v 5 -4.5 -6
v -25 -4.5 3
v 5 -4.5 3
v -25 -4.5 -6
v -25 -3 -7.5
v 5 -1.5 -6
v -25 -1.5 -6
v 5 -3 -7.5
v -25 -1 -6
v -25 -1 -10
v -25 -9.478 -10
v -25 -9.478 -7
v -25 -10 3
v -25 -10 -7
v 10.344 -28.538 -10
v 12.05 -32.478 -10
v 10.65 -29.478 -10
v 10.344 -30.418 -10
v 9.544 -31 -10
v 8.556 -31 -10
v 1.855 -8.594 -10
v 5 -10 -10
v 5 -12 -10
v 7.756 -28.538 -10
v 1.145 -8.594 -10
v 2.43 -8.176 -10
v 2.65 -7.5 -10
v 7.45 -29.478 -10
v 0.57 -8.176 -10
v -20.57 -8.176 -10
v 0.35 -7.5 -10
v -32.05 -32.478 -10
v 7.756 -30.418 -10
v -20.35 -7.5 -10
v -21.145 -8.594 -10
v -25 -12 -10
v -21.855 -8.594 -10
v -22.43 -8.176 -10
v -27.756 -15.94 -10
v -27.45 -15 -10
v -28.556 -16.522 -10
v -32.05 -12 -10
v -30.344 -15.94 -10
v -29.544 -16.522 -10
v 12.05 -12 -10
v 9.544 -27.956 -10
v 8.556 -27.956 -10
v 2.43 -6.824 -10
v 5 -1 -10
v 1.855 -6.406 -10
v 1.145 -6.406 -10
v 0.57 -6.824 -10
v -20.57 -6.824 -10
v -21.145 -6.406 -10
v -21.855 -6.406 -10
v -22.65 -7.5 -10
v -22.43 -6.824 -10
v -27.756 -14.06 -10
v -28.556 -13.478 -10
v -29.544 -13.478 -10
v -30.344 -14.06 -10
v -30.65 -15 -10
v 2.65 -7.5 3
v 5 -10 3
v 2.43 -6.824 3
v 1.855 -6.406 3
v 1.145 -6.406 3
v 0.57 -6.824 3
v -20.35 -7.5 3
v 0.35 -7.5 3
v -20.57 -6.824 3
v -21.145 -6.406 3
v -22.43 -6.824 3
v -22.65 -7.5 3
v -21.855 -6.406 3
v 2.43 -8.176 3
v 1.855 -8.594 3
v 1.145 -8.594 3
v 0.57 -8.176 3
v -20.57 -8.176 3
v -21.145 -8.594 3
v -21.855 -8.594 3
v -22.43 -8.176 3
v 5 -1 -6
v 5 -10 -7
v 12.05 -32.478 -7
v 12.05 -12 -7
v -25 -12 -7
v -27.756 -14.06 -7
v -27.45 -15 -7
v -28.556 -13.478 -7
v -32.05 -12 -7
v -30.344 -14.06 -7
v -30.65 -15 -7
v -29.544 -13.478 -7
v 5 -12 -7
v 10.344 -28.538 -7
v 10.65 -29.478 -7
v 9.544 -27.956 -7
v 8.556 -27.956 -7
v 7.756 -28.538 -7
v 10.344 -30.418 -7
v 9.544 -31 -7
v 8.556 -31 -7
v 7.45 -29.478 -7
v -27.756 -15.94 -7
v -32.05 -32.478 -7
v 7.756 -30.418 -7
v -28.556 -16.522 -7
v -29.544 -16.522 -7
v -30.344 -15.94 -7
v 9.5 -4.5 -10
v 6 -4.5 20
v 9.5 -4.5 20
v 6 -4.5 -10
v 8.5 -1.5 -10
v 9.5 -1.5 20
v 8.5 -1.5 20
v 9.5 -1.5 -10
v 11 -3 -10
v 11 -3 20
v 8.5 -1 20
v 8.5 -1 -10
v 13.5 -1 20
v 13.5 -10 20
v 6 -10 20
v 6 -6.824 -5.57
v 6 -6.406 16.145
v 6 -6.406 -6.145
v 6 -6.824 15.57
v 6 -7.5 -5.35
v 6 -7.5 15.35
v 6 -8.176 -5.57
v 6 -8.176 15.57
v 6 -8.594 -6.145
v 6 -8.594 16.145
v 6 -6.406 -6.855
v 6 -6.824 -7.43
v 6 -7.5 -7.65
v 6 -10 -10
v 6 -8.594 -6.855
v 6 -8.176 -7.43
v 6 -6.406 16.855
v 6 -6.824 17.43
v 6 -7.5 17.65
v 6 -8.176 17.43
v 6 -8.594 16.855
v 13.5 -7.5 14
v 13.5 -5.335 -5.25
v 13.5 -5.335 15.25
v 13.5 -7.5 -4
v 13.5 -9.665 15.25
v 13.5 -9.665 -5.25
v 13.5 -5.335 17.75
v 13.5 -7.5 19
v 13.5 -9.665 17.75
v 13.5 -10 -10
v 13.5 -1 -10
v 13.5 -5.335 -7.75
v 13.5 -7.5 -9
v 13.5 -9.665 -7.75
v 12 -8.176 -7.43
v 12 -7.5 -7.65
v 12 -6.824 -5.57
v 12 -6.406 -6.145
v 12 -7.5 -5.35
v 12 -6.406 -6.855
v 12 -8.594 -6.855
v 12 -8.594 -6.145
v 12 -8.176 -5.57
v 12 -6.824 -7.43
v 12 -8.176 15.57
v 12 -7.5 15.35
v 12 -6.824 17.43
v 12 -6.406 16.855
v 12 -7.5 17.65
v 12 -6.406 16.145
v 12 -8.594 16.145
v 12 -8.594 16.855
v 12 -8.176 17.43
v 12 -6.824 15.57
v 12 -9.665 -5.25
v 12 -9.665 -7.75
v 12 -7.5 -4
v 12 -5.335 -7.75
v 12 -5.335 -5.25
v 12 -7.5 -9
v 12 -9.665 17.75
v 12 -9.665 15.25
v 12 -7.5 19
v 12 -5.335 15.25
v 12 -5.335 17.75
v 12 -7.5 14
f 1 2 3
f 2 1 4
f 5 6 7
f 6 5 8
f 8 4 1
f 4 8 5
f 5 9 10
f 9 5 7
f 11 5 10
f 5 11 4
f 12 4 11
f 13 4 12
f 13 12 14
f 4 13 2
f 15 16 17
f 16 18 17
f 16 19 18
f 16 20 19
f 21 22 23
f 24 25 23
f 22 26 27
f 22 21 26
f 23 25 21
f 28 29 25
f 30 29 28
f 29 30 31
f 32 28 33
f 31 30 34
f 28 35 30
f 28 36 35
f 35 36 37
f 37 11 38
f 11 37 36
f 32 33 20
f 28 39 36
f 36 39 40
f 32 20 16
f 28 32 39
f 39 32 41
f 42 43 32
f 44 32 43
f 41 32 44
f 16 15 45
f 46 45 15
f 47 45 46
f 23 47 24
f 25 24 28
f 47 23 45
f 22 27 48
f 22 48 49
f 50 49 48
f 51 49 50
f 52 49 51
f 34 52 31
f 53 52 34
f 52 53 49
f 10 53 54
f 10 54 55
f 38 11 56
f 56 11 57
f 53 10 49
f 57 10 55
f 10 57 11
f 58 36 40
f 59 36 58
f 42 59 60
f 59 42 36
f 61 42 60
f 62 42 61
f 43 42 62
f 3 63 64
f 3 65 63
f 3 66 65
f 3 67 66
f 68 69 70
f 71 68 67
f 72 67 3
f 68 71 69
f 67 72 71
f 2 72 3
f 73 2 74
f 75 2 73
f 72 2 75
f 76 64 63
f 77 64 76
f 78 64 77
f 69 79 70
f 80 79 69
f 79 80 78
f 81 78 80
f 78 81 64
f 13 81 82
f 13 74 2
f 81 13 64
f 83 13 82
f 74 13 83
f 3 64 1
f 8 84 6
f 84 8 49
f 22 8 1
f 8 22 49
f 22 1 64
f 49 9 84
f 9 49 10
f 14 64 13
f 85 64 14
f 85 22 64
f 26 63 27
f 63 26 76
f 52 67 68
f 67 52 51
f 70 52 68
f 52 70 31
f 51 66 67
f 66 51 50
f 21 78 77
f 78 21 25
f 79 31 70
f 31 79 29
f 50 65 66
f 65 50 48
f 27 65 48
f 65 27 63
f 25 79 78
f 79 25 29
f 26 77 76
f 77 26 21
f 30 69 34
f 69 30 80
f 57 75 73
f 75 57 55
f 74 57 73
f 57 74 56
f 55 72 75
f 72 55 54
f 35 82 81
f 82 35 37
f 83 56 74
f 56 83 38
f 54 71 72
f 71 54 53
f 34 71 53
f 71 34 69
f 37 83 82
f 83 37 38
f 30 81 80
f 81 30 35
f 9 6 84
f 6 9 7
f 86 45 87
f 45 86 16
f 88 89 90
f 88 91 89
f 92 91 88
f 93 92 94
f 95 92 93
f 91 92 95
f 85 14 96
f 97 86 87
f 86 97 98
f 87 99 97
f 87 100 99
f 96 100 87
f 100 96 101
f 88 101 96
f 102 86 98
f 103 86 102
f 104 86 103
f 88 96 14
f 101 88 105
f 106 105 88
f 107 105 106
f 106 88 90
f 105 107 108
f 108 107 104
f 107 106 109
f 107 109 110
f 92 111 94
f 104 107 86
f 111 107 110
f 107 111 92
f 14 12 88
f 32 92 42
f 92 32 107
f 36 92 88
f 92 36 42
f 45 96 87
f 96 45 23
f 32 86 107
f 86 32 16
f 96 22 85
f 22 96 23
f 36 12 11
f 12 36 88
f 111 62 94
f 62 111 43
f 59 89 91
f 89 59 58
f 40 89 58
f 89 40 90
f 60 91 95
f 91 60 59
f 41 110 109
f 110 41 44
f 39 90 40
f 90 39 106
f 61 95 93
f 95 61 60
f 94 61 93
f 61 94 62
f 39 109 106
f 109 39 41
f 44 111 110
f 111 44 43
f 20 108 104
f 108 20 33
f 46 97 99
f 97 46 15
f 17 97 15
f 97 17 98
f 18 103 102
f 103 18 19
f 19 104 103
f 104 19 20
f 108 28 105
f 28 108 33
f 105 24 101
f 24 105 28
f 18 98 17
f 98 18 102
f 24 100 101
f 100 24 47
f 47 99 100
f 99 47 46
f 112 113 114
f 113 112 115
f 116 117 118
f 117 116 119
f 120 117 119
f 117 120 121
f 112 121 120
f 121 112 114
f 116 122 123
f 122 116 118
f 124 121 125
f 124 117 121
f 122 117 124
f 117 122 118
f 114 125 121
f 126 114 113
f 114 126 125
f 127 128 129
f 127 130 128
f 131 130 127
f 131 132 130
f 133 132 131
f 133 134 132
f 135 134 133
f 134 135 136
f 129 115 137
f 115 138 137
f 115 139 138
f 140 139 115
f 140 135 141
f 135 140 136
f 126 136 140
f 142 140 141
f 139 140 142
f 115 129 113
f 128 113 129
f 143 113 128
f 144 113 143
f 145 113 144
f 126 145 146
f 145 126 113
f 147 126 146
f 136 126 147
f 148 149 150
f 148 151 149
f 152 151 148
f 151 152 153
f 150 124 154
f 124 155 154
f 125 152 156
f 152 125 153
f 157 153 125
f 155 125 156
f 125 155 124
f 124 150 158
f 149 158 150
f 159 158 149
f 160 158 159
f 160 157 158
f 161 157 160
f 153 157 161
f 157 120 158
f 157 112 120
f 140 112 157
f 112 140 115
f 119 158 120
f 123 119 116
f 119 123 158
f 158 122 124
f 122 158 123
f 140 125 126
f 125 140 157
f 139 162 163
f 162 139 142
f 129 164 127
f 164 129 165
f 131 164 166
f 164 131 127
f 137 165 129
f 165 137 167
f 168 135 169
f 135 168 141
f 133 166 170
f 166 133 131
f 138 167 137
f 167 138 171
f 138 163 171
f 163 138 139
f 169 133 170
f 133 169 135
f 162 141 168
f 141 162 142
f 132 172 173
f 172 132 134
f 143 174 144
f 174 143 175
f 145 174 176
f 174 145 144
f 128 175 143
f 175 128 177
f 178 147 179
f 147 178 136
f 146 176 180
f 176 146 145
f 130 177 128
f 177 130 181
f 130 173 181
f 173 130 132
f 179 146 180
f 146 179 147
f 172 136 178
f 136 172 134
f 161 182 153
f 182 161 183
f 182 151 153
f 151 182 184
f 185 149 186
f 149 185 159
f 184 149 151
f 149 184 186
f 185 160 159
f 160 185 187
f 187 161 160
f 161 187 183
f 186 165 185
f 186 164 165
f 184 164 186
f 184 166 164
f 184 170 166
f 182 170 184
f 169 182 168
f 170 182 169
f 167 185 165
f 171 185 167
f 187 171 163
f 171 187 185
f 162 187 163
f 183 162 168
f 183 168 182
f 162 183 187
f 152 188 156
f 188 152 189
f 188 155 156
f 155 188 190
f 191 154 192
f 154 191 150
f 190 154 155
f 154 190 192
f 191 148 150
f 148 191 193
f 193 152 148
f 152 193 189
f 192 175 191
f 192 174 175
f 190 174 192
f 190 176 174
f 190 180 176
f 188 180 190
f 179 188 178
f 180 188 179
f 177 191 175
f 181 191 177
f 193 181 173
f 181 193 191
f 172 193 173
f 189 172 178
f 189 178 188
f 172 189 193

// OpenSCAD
// file: lib/railSystem.scad
module rail($length, $spacing = true){
    $height = 15;
    $partWidth = 5;
    
    translate([0,-3,0]){
        difference(){
            translate([0,-1.5,-$height/2]) cube([$length,3,$height]);
            translate([0,0,$height/2])rotate([-45,0,0])cube([$length,10,10]);
            mirror([0,1,0])translate([0,0,$height/2])rotate([-45,0,0])cube([$length,10,10]);   
           
            translate([0,0,-$height/2])rotate([-45,0,0])cube([$length,10,10]);
            mirror([0,1,0])translate([0,0,-$height/2])rotate([-45,0,0])cube([$length,10,10]);  
            
            
    if($spacing)        
         for(i = [$partWidth : $partWidth * 2 : $length]){
            rotate([180,0,0])translate([i,0.5,-$height/2])cube([$partWidth,50,$height]);
        }
            
        }
        

        
        translate([0,0,-$height*1/(1.5*2)])cube([$length,3,$height/1.5]);
    }
}


module railMount($width, $onlyPart = 0){
    difference(){
        union(){
    
            if($onlyPart!=1)translate([0,-10,-3])cube([$width,9,13]);
            if($onlyPart!=2)translate([0,-10,-11.5])cube([$width,9,7.5]);
        }
    
    translate([-1,0,0])rail($width + 2, false);
    translate([-1,0,-1.5])rail($width + 2, false);
        
    translate([3.5,-7.5,-15])
        cylinder(d=2.3,50, $fn=10);
    translate([$width - 3.5,-7.5,-15])
        cylinder(d=2.3,50, $fn=10);
    translate([3.5,-7.5,-11.6])cylinder(d=5,1.6,$fn=6);
    translate([$width - 3.5,-7.5,-11.6])cylinder(d=5,1.6,$fn=6);
            
    translate([-1,-2,-6])cube([$width + 2,2,12]);
    }
}
// main file
include <lib/railSystem.scad>;

module sonarMount(){
    rotate([0,180,0])
    translate([-5,0,0])railMount(30,2);

    translate([-38.1/2 -10, -14.478 - 15, -10])
    difference(){
        union(){
            translate([-3,-3,0])cube([38.1 + 6,14.478 + 6,3]);
            translate([38.1/2 - 15,10,0])cube([30,10,3]);
            //cylinder(d=5.5,6,$fn=10);
            //translate([38.1,14.478,0])cylinder(d=5.5,6,$fn=10);
        }
        translate([0,14.478,0])cylinder(d=3.2,20,$fn=10);
        translate([38.1,0,0])cylinder(d=3.2,20,$fn=10);
    }
    
    translate([2,0,-10])
    rotate([0,-90,0])railMount(30,1);
}

sonarMount();
